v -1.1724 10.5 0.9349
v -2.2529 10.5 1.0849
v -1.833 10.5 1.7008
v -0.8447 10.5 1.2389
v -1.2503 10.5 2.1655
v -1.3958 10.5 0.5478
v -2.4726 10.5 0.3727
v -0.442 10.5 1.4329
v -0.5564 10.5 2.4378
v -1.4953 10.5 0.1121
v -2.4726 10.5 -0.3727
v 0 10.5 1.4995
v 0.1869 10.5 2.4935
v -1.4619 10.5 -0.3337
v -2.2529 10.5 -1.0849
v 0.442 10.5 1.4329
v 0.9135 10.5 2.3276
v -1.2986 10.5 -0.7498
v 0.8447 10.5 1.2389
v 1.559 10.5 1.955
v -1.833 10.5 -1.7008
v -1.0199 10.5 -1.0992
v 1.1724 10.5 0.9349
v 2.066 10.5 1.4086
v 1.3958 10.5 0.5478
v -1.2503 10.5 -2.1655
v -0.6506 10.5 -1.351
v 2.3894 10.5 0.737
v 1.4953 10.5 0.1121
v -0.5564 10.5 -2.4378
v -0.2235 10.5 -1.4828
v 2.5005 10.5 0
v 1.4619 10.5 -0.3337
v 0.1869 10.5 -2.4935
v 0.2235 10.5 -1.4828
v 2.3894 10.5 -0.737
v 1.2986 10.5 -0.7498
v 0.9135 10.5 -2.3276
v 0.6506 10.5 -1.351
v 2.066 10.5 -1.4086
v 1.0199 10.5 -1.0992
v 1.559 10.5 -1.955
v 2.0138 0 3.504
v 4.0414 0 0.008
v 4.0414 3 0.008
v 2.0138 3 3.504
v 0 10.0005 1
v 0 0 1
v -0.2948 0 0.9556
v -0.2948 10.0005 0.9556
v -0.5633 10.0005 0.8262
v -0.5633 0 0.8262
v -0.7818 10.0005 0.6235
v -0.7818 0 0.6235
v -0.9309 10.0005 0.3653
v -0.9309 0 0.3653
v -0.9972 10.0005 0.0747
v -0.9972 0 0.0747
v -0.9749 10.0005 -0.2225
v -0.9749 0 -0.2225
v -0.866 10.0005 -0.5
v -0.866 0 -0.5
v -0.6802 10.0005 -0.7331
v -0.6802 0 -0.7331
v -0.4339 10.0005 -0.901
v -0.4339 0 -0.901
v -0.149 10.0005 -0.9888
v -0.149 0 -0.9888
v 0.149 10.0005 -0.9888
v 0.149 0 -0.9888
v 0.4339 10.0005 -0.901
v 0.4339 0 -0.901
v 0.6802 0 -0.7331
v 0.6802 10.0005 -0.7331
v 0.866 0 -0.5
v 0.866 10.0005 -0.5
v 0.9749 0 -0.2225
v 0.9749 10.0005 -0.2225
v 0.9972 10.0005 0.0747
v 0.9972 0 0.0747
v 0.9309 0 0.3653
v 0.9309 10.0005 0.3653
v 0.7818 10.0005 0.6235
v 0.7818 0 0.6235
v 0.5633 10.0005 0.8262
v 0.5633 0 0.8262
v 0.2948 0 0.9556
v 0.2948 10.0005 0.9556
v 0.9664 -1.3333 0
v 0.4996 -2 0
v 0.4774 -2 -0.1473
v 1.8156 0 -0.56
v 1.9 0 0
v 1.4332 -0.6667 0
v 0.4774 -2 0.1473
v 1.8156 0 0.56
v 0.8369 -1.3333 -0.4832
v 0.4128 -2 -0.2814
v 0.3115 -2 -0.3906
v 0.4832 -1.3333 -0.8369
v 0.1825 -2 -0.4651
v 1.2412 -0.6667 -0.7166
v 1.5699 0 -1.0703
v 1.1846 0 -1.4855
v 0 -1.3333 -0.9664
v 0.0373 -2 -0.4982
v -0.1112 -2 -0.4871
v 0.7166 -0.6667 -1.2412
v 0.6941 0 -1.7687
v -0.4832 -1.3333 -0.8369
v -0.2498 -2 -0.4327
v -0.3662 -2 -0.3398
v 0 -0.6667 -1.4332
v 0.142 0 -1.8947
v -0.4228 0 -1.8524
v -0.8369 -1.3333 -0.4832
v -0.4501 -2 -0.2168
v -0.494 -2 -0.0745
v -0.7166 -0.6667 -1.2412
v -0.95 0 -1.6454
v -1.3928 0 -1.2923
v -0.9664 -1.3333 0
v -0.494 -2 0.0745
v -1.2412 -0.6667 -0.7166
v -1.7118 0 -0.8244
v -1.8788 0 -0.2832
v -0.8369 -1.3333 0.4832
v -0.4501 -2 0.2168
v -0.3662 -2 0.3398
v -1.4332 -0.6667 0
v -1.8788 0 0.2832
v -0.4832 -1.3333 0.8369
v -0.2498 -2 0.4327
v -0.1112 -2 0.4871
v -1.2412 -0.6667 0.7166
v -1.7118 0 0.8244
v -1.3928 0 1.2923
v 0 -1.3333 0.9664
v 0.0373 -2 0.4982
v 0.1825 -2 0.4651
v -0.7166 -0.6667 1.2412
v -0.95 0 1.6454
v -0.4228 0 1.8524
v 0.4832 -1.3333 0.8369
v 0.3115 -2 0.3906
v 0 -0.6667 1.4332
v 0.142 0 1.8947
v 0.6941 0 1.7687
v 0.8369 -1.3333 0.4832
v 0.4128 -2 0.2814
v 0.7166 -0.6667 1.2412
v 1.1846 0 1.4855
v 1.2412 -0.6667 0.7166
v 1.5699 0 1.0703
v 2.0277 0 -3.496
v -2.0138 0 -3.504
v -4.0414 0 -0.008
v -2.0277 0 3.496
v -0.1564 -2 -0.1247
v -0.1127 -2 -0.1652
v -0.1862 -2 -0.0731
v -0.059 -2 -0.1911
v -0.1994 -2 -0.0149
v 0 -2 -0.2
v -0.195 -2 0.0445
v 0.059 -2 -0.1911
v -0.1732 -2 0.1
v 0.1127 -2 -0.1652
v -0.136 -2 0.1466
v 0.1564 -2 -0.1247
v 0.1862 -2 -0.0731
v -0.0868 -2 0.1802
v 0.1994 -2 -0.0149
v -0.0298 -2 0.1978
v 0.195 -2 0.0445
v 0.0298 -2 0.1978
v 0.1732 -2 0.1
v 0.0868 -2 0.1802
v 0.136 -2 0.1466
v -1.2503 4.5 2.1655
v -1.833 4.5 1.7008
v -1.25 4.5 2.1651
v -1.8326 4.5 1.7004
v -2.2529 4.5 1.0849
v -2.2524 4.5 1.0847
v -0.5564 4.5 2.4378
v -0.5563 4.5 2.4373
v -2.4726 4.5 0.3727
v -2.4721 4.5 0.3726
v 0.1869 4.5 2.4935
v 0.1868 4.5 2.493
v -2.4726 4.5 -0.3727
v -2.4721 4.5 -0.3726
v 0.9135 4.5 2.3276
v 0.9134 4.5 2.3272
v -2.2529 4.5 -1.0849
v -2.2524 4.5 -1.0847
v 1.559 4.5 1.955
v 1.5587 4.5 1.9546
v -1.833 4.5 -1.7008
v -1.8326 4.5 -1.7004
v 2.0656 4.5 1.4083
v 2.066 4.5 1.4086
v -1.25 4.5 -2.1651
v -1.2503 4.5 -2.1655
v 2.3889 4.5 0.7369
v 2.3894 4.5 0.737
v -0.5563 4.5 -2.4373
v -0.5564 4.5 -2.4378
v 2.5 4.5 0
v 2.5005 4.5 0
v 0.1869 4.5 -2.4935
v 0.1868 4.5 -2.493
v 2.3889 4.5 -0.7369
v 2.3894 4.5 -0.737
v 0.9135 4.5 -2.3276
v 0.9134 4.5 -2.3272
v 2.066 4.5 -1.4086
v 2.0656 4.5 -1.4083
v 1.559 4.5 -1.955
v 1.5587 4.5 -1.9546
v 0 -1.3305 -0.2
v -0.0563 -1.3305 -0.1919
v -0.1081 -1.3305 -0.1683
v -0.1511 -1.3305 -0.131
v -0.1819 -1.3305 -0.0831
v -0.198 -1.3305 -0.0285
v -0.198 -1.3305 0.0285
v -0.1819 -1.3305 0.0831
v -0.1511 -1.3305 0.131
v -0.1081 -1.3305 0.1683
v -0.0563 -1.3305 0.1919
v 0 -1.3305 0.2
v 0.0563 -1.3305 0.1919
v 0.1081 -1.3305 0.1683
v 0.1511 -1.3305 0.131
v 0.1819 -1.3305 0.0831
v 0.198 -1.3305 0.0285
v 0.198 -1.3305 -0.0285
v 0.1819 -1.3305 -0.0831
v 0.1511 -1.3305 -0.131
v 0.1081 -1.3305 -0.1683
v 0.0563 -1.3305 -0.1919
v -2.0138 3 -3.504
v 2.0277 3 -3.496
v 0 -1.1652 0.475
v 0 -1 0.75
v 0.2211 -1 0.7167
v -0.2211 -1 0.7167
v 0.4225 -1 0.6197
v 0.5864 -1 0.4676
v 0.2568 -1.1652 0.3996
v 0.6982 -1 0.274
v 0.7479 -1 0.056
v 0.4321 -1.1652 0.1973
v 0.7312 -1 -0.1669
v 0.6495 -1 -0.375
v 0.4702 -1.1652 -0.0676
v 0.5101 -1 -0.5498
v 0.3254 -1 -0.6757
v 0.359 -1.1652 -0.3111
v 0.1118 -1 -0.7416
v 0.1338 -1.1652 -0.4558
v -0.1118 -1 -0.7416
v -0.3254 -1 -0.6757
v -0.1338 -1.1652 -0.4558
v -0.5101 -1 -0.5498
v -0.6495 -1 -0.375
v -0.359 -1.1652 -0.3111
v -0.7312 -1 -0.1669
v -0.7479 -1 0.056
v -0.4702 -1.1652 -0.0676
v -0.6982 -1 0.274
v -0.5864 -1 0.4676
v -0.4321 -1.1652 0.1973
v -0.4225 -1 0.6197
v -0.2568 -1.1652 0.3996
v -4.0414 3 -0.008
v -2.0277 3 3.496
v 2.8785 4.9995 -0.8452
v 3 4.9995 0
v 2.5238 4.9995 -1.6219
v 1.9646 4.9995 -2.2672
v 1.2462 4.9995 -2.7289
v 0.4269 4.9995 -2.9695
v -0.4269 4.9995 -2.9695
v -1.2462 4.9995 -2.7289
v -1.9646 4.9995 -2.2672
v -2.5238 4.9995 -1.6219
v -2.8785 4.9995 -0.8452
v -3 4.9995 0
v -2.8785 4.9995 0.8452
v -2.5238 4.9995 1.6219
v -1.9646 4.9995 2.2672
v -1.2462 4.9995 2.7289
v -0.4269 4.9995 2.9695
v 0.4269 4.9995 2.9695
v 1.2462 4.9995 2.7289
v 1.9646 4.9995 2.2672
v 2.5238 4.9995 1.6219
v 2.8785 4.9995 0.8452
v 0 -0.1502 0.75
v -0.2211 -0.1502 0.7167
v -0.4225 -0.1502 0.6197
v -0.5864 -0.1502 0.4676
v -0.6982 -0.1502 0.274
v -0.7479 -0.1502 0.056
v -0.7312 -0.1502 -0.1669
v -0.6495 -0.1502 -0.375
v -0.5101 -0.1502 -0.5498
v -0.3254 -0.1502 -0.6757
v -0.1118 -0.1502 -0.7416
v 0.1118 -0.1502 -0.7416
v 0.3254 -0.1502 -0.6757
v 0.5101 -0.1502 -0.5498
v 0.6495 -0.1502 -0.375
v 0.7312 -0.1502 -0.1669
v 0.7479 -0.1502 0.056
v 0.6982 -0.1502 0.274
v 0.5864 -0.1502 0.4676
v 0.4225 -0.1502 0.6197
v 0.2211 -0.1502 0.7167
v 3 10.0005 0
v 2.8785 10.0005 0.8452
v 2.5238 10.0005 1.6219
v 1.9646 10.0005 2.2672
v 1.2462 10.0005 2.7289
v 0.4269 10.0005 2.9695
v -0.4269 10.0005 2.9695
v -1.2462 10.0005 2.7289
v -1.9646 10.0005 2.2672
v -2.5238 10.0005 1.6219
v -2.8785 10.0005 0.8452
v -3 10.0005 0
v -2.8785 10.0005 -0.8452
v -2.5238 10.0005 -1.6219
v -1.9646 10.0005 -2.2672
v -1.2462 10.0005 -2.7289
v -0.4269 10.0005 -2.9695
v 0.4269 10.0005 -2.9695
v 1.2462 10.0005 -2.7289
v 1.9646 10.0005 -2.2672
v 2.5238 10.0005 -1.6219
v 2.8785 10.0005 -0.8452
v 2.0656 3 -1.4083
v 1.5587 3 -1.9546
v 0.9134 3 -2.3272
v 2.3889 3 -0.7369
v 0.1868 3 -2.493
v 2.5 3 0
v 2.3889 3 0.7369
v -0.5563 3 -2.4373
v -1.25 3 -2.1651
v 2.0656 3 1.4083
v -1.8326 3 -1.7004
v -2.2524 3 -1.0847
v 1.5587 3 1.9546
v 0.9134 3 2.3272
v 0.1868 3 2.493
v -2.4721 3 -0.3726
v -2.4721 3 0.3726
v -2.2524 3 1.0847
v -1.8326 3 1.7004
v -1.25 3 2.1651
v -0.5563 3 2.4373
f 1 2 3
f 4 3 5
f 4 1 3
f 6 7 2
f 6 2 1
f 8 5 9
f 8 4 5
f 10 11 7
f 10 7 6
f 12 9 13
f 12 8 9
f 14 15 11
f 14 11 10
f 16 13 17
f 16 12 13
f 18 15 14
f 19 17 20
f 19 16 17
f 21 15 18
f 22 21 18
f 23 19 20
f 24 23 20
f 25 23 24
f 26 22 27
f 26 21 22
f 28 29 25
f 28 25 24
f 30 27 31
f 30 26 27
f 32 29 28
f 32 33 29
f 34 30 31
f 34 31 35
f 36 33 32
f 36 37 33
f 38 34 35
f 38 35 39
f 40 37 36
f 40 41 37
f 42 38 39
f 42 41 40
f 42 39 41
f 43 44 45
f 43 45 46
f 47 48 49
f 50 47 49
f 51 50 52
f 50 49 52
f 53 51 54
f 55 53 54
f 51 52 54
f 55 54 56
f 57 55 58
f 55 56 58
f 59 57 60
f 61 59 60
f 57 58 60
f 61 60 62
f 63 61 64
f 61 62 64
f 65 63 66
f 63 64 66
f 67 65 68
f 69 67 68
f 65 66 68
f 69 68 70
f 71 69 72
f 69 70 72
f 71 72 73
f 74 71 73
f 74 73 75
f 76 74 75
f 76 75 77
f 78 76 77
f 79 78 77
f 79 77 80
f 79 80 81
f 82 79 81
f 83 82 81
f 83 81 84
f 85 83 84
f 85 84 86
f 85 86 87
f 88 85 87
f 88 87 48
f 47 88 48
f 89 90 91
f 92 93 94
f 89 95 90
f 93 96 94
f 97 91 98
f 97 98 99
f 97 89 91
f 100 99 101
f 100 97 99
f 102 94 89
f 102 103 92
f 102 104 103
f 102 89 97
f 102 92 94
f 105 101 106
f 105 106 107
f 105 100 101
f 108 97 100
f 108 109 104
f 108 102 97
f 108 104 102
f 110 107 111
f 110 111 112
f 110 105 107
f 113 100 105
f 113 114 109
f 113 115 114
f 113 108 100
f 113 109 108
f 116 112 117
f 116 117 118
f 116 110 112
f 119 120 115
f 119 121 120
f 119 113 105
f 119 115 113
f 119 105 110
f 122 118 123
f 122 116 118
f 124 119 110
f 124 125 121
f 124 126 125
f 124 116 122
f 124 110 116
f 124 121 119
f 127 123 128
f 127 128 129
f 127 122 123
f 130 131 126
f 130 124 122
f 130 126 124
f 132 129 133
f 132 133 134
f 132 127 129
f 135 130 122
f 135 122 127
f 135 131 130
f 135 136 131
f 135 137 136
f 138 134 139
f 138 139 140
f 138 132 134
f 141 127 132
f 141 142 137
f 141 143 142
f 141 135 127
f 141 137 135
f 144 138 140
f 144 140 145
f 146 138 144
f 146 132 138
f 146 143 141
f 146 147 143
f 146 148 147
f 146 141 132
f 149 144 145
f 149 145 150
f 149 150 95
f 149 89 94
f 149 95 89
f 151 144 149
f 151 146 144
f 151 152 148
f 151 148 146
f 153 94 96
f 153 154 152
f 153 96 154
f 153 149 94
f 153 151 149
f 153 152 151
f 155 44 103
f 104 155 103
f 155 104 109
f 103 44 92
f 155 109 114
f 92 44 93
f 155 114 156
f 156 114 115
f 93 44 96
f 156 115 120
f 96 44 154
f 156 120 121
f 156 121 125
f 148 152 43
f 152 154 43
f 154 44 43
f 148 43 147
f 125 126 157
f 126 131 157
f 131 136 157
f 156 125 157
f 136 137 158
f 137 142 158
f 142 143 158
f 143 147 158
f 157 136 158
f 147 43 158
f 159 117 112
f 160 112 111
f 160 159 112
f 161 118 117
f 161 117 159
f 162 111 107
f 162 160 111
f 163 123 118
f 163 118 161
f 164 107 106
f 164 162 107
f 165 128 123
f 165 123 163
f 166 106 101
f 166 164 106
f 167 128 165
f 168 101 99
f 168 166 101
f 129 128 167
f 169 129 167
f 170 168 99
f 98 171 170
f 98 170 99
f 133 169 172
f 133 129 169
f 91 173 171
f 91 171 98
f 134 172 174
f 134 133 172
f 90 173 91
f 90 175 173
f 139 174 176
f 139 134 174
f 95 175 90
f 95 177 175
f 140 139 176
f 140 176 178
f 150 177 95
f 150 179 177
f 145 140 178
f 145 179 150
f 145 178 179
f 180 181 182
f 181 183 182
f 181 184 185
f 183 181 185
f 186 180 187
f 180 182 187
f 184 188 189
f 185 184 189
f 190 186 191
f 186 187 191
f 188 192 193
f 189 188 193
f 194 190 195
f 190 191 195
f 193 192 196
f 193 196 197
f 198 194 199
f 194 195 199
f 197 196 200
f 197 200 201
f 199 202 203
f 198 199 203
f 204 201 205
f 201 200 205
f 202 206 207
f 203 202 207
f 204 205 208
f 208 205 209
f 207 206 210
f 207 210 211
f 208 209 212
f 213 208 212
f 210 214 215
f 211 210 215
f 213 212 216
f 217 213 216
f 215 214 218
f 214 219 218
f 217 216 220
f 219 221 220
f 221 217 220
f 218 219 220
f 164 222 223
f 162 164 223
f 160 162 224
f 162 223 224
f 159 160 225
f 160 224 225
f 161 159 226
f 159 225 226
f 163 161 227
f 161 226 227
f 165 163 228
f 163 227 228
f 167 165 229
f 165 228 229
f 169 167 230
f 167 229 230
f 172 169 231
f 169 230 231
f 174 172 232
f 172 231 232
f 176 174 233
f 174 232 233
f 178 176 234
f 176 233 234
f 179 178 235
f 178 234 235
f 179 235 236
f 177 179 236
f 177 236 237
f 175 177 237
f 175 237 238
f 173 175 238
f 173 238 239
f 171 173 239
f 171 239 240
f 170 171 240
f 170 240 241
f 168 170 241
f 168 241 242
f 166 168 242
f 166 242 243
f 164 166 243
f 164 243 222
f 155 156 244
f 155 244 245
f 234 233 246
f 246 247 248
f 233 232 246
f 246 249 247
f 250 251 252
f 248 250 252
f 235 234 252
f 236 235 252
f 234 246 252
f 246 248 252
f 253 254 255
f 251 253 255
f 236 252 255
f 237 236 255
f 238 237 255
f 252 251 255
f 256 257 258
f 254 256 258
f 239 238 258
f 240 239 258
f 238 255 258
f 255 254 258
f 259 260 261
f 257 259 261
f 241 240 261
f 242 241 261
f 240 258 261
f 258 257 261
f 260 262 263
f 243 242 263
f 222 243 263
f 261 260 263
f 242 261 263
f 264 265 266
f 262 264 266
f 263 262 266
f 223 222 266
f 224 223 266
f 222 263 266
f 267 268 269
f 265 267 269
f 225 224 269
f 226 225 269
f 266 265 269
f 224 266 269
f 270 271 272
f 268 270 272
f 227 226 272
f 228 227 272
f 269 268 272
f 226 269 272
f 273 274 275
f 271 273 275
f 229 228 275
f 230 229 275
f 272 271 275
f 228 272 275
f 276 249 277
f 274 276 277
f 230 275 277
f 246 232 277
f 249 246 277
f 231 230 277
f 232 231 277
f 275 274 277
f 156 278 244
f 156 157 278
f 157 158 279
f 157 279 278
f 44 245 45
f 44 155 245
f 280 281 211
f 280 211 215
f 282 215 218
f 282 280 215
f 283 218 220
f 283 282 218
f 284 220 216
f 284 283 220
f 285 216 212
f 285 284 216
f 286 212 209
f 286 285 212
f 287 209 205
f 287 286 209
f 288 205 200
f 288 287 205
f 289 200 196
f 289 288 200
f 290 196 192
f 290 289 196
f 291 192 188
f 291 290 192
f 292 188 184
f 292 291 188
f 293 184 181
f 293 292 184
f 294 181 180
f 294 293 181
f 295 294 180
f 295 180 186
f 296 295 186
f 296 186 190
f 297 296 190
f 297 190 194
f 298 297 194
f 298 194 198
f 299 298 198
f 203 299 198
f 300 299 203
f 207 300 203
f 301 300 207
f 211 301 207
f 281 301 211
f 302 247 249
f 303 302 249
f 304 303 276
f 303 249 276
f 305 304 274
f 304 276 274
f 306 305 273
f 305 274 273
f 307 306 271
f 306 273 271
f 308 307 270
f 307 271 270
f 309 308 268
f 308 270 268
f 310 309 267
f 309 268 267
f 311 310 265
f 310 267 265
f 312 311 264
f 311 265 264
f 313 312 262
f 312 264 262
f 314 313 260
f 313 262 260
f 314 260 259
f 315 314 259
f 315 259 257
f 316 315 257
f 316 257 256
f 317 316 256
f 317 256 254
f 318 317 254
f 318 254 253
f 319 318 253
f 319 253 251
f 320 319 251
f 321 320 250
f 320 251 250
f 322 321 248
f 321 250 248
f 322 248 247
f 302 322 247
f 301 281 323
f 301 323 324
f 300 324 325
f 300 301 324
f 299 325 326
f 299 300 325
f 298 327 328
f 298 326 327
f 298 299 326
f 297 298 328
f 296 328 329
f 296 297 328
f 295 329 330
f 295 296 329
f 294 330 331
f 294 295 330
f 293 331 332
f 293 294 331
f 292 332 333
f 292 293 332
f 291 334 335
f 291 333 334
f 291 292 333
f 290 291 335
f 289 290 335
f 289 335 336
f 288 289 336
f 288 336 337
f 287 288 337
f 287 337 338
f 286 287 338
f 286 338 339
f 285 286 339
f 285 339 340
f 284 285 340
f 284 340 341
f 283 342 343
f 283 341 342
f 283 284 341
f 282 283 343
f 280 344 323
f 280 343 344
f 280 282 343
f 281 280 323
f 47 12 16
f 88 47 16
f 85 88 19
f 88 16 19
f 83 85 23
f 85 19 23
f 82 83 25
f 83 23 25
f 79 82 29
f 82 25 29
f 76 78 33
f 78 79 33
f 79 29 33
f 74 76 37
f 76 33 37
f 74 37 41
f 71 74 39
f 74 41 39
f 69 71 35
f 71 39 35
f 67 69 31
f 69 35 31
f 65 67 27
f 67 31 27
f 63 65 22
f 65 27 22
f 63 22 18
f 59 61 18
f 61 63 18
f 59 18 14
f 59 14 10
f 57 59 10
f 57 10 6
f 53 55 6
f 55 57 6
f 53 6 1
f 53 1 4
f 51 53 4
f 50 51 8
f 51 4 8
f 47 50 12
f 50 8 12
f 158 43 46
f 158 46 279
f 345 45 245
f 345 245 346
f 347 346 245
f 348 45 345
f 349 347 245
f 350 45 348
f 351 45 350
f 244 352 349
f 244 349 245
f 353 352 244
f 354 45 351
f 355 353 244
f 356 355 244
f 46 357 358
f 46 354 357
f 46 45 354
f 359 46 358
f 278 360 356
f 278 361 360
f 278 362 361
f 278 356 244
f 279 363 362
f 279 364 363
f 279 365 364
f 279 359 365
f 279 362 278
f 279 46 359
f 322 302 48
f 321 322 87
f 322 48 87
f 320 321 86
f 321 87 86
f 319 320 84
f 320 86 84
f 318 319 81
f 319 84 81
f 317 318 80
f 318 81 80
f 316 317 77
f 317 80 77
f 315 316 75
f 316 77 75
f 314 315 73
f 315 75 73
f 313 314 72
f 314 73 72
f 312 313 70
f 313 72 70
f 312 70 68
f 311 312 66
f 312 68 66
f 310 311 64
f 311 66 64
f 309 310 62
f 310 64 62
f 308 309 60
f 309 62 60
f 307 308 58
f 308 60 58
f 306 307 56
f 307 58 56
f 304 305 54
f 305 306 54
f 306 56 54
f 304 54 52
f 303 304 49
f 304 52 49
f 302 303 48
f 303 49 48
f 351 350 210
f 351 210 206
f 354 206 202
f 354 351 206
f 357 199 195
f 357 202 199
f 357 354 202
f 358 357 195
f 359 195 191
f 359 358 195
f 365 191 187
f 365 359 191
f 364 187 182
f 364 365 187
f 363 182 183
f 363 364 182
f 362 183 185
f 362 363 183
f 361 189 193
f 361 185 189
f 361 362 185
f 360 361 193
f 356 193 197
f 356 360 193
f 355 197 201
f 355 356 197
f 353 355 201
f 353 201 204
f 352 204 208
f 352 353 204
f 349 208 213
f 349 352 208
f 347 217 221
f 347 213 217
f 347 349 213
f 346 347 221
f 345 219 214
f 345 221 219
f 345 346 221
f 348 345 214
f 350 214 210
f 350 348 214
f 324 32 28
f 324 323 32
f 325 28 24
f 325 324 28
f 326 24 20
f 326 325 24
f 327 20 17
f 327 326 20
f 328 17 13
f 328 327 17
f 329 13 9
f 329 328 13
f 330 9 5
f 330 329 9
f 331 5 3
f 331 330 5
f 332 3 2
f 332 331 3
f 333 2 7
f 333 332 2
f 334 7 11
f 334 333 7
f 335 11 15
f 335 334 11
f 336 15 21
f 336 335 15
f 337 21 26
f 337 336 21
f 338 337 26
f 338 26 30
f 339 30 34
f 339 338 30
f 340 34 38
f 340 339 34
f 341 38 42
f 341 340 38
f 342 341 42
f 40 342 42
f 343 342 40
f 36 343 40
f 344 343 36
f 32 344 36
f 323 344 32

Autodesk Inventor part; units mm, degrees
ref_plane "YZ Plane" through (0, 0, 0) normal (1, 0, 0) x (0, 1, 0)
ref_plane "XZ Plane" through (0, 0, 0) normal (0, 1, 0) x (-1, 0, 0)
ref_plane "XY Plane" through (0, 0, 0) normal (0, 0, 1) x (1, 0, 0)
sketch "草圖1" plane through (0, 0, 0) normal (0, 1, 0) x (-1, 0, 0)
  line L0 (2.0138, -3.504) -> (-2.0277, -3.496)
  line L1 (-2.0277, -3.496) -> (-4.0414, 0.008)
  line L2 (-4.0414, 0.008) -> (-2.0138, 3.504)
  line L3 (-2.0138, 3.504) -> (2.0277, 3.496)
  line L4 (2.0277, 3.496) -> (4.0414, -0.008)
  line L5 (4.0414, -0.008) -> (2.0138, -3.504)
  point P0 (0, 0)
  point P1 (0, 0)
  dimension "d0" = 7
extrude "擠出1" add sketch "草圖1" along normal blind 3
sketch "草圖2" plane through (0, 3, 0) normal (0, 1, 0) x (1, 0, 0)
  circle A0 centre (0, 0) radius 2.5
  dimension "d3" = 5
extrude "擠出2" add sketch "草圖2" along normal blind 1.5
sketch "草圖3" plane through (0, 4.5, 0) normal (0, 1, 0) x (1, 0, 0)
  circle A0 centre (0, 0) radius 2.5 projected
  circle A1 centre (0, 0) radius 3
  dimension "d7" = 6
extrude "擠出3" add sketch "草圖3" along normal blind 6 contours A0 | A1
sketch "草圖4" plane through (0, 0, 0) normal (0, -1, 0) x (1, 0, 0)
  circle A0 centre (0, 0) radius 1.9
  dimension "d11" = 3.8
extrude "擠出4" add sketch "草圖4" along normal blind 2 draft -35
sketch "草圖5" plane through (0, 10.5, 0) normal (0, 1, 0) x (1, 0, 0)
  circle A0 centre (0, 0) radius 3 projected
hole "孔1" at (0, 10.5, 0) direction (0, -1, 0) diameter 2 depth 10.5 tip angle 118
chamfer "倒角1" distance 0.5 angle 45 3 edges at (-3, 4.5, 0) (-3, 10.5, 0) (0, 10.5, -1)
thread "螺紋1" size "M6x1" class "6g" standard "ANSI Metric M Profile" full length
sketch "草圖6" plane through (0, -2, 0) normal (0, -1, 0) x (1, 0, 0)
  circle A0 centre (0, 0) radius 0.4996 projected
hole "孔2" at (0, -2, 0) direction (0, 1, 0) diameter 0.4 end through all
sketch "草圖7" plane through (0, 10.5, 0) normal (0, 1, 0) x (1, 0, 0)
  circle A0 centre (0, 0) radius 1.5 projected
hole "孔3" at (0, 10.5, 0) direction (0, -1, 0) diameter 1.5 depth 11.5 tip angle 118
properties part number "e3d_v6_nozzle"
